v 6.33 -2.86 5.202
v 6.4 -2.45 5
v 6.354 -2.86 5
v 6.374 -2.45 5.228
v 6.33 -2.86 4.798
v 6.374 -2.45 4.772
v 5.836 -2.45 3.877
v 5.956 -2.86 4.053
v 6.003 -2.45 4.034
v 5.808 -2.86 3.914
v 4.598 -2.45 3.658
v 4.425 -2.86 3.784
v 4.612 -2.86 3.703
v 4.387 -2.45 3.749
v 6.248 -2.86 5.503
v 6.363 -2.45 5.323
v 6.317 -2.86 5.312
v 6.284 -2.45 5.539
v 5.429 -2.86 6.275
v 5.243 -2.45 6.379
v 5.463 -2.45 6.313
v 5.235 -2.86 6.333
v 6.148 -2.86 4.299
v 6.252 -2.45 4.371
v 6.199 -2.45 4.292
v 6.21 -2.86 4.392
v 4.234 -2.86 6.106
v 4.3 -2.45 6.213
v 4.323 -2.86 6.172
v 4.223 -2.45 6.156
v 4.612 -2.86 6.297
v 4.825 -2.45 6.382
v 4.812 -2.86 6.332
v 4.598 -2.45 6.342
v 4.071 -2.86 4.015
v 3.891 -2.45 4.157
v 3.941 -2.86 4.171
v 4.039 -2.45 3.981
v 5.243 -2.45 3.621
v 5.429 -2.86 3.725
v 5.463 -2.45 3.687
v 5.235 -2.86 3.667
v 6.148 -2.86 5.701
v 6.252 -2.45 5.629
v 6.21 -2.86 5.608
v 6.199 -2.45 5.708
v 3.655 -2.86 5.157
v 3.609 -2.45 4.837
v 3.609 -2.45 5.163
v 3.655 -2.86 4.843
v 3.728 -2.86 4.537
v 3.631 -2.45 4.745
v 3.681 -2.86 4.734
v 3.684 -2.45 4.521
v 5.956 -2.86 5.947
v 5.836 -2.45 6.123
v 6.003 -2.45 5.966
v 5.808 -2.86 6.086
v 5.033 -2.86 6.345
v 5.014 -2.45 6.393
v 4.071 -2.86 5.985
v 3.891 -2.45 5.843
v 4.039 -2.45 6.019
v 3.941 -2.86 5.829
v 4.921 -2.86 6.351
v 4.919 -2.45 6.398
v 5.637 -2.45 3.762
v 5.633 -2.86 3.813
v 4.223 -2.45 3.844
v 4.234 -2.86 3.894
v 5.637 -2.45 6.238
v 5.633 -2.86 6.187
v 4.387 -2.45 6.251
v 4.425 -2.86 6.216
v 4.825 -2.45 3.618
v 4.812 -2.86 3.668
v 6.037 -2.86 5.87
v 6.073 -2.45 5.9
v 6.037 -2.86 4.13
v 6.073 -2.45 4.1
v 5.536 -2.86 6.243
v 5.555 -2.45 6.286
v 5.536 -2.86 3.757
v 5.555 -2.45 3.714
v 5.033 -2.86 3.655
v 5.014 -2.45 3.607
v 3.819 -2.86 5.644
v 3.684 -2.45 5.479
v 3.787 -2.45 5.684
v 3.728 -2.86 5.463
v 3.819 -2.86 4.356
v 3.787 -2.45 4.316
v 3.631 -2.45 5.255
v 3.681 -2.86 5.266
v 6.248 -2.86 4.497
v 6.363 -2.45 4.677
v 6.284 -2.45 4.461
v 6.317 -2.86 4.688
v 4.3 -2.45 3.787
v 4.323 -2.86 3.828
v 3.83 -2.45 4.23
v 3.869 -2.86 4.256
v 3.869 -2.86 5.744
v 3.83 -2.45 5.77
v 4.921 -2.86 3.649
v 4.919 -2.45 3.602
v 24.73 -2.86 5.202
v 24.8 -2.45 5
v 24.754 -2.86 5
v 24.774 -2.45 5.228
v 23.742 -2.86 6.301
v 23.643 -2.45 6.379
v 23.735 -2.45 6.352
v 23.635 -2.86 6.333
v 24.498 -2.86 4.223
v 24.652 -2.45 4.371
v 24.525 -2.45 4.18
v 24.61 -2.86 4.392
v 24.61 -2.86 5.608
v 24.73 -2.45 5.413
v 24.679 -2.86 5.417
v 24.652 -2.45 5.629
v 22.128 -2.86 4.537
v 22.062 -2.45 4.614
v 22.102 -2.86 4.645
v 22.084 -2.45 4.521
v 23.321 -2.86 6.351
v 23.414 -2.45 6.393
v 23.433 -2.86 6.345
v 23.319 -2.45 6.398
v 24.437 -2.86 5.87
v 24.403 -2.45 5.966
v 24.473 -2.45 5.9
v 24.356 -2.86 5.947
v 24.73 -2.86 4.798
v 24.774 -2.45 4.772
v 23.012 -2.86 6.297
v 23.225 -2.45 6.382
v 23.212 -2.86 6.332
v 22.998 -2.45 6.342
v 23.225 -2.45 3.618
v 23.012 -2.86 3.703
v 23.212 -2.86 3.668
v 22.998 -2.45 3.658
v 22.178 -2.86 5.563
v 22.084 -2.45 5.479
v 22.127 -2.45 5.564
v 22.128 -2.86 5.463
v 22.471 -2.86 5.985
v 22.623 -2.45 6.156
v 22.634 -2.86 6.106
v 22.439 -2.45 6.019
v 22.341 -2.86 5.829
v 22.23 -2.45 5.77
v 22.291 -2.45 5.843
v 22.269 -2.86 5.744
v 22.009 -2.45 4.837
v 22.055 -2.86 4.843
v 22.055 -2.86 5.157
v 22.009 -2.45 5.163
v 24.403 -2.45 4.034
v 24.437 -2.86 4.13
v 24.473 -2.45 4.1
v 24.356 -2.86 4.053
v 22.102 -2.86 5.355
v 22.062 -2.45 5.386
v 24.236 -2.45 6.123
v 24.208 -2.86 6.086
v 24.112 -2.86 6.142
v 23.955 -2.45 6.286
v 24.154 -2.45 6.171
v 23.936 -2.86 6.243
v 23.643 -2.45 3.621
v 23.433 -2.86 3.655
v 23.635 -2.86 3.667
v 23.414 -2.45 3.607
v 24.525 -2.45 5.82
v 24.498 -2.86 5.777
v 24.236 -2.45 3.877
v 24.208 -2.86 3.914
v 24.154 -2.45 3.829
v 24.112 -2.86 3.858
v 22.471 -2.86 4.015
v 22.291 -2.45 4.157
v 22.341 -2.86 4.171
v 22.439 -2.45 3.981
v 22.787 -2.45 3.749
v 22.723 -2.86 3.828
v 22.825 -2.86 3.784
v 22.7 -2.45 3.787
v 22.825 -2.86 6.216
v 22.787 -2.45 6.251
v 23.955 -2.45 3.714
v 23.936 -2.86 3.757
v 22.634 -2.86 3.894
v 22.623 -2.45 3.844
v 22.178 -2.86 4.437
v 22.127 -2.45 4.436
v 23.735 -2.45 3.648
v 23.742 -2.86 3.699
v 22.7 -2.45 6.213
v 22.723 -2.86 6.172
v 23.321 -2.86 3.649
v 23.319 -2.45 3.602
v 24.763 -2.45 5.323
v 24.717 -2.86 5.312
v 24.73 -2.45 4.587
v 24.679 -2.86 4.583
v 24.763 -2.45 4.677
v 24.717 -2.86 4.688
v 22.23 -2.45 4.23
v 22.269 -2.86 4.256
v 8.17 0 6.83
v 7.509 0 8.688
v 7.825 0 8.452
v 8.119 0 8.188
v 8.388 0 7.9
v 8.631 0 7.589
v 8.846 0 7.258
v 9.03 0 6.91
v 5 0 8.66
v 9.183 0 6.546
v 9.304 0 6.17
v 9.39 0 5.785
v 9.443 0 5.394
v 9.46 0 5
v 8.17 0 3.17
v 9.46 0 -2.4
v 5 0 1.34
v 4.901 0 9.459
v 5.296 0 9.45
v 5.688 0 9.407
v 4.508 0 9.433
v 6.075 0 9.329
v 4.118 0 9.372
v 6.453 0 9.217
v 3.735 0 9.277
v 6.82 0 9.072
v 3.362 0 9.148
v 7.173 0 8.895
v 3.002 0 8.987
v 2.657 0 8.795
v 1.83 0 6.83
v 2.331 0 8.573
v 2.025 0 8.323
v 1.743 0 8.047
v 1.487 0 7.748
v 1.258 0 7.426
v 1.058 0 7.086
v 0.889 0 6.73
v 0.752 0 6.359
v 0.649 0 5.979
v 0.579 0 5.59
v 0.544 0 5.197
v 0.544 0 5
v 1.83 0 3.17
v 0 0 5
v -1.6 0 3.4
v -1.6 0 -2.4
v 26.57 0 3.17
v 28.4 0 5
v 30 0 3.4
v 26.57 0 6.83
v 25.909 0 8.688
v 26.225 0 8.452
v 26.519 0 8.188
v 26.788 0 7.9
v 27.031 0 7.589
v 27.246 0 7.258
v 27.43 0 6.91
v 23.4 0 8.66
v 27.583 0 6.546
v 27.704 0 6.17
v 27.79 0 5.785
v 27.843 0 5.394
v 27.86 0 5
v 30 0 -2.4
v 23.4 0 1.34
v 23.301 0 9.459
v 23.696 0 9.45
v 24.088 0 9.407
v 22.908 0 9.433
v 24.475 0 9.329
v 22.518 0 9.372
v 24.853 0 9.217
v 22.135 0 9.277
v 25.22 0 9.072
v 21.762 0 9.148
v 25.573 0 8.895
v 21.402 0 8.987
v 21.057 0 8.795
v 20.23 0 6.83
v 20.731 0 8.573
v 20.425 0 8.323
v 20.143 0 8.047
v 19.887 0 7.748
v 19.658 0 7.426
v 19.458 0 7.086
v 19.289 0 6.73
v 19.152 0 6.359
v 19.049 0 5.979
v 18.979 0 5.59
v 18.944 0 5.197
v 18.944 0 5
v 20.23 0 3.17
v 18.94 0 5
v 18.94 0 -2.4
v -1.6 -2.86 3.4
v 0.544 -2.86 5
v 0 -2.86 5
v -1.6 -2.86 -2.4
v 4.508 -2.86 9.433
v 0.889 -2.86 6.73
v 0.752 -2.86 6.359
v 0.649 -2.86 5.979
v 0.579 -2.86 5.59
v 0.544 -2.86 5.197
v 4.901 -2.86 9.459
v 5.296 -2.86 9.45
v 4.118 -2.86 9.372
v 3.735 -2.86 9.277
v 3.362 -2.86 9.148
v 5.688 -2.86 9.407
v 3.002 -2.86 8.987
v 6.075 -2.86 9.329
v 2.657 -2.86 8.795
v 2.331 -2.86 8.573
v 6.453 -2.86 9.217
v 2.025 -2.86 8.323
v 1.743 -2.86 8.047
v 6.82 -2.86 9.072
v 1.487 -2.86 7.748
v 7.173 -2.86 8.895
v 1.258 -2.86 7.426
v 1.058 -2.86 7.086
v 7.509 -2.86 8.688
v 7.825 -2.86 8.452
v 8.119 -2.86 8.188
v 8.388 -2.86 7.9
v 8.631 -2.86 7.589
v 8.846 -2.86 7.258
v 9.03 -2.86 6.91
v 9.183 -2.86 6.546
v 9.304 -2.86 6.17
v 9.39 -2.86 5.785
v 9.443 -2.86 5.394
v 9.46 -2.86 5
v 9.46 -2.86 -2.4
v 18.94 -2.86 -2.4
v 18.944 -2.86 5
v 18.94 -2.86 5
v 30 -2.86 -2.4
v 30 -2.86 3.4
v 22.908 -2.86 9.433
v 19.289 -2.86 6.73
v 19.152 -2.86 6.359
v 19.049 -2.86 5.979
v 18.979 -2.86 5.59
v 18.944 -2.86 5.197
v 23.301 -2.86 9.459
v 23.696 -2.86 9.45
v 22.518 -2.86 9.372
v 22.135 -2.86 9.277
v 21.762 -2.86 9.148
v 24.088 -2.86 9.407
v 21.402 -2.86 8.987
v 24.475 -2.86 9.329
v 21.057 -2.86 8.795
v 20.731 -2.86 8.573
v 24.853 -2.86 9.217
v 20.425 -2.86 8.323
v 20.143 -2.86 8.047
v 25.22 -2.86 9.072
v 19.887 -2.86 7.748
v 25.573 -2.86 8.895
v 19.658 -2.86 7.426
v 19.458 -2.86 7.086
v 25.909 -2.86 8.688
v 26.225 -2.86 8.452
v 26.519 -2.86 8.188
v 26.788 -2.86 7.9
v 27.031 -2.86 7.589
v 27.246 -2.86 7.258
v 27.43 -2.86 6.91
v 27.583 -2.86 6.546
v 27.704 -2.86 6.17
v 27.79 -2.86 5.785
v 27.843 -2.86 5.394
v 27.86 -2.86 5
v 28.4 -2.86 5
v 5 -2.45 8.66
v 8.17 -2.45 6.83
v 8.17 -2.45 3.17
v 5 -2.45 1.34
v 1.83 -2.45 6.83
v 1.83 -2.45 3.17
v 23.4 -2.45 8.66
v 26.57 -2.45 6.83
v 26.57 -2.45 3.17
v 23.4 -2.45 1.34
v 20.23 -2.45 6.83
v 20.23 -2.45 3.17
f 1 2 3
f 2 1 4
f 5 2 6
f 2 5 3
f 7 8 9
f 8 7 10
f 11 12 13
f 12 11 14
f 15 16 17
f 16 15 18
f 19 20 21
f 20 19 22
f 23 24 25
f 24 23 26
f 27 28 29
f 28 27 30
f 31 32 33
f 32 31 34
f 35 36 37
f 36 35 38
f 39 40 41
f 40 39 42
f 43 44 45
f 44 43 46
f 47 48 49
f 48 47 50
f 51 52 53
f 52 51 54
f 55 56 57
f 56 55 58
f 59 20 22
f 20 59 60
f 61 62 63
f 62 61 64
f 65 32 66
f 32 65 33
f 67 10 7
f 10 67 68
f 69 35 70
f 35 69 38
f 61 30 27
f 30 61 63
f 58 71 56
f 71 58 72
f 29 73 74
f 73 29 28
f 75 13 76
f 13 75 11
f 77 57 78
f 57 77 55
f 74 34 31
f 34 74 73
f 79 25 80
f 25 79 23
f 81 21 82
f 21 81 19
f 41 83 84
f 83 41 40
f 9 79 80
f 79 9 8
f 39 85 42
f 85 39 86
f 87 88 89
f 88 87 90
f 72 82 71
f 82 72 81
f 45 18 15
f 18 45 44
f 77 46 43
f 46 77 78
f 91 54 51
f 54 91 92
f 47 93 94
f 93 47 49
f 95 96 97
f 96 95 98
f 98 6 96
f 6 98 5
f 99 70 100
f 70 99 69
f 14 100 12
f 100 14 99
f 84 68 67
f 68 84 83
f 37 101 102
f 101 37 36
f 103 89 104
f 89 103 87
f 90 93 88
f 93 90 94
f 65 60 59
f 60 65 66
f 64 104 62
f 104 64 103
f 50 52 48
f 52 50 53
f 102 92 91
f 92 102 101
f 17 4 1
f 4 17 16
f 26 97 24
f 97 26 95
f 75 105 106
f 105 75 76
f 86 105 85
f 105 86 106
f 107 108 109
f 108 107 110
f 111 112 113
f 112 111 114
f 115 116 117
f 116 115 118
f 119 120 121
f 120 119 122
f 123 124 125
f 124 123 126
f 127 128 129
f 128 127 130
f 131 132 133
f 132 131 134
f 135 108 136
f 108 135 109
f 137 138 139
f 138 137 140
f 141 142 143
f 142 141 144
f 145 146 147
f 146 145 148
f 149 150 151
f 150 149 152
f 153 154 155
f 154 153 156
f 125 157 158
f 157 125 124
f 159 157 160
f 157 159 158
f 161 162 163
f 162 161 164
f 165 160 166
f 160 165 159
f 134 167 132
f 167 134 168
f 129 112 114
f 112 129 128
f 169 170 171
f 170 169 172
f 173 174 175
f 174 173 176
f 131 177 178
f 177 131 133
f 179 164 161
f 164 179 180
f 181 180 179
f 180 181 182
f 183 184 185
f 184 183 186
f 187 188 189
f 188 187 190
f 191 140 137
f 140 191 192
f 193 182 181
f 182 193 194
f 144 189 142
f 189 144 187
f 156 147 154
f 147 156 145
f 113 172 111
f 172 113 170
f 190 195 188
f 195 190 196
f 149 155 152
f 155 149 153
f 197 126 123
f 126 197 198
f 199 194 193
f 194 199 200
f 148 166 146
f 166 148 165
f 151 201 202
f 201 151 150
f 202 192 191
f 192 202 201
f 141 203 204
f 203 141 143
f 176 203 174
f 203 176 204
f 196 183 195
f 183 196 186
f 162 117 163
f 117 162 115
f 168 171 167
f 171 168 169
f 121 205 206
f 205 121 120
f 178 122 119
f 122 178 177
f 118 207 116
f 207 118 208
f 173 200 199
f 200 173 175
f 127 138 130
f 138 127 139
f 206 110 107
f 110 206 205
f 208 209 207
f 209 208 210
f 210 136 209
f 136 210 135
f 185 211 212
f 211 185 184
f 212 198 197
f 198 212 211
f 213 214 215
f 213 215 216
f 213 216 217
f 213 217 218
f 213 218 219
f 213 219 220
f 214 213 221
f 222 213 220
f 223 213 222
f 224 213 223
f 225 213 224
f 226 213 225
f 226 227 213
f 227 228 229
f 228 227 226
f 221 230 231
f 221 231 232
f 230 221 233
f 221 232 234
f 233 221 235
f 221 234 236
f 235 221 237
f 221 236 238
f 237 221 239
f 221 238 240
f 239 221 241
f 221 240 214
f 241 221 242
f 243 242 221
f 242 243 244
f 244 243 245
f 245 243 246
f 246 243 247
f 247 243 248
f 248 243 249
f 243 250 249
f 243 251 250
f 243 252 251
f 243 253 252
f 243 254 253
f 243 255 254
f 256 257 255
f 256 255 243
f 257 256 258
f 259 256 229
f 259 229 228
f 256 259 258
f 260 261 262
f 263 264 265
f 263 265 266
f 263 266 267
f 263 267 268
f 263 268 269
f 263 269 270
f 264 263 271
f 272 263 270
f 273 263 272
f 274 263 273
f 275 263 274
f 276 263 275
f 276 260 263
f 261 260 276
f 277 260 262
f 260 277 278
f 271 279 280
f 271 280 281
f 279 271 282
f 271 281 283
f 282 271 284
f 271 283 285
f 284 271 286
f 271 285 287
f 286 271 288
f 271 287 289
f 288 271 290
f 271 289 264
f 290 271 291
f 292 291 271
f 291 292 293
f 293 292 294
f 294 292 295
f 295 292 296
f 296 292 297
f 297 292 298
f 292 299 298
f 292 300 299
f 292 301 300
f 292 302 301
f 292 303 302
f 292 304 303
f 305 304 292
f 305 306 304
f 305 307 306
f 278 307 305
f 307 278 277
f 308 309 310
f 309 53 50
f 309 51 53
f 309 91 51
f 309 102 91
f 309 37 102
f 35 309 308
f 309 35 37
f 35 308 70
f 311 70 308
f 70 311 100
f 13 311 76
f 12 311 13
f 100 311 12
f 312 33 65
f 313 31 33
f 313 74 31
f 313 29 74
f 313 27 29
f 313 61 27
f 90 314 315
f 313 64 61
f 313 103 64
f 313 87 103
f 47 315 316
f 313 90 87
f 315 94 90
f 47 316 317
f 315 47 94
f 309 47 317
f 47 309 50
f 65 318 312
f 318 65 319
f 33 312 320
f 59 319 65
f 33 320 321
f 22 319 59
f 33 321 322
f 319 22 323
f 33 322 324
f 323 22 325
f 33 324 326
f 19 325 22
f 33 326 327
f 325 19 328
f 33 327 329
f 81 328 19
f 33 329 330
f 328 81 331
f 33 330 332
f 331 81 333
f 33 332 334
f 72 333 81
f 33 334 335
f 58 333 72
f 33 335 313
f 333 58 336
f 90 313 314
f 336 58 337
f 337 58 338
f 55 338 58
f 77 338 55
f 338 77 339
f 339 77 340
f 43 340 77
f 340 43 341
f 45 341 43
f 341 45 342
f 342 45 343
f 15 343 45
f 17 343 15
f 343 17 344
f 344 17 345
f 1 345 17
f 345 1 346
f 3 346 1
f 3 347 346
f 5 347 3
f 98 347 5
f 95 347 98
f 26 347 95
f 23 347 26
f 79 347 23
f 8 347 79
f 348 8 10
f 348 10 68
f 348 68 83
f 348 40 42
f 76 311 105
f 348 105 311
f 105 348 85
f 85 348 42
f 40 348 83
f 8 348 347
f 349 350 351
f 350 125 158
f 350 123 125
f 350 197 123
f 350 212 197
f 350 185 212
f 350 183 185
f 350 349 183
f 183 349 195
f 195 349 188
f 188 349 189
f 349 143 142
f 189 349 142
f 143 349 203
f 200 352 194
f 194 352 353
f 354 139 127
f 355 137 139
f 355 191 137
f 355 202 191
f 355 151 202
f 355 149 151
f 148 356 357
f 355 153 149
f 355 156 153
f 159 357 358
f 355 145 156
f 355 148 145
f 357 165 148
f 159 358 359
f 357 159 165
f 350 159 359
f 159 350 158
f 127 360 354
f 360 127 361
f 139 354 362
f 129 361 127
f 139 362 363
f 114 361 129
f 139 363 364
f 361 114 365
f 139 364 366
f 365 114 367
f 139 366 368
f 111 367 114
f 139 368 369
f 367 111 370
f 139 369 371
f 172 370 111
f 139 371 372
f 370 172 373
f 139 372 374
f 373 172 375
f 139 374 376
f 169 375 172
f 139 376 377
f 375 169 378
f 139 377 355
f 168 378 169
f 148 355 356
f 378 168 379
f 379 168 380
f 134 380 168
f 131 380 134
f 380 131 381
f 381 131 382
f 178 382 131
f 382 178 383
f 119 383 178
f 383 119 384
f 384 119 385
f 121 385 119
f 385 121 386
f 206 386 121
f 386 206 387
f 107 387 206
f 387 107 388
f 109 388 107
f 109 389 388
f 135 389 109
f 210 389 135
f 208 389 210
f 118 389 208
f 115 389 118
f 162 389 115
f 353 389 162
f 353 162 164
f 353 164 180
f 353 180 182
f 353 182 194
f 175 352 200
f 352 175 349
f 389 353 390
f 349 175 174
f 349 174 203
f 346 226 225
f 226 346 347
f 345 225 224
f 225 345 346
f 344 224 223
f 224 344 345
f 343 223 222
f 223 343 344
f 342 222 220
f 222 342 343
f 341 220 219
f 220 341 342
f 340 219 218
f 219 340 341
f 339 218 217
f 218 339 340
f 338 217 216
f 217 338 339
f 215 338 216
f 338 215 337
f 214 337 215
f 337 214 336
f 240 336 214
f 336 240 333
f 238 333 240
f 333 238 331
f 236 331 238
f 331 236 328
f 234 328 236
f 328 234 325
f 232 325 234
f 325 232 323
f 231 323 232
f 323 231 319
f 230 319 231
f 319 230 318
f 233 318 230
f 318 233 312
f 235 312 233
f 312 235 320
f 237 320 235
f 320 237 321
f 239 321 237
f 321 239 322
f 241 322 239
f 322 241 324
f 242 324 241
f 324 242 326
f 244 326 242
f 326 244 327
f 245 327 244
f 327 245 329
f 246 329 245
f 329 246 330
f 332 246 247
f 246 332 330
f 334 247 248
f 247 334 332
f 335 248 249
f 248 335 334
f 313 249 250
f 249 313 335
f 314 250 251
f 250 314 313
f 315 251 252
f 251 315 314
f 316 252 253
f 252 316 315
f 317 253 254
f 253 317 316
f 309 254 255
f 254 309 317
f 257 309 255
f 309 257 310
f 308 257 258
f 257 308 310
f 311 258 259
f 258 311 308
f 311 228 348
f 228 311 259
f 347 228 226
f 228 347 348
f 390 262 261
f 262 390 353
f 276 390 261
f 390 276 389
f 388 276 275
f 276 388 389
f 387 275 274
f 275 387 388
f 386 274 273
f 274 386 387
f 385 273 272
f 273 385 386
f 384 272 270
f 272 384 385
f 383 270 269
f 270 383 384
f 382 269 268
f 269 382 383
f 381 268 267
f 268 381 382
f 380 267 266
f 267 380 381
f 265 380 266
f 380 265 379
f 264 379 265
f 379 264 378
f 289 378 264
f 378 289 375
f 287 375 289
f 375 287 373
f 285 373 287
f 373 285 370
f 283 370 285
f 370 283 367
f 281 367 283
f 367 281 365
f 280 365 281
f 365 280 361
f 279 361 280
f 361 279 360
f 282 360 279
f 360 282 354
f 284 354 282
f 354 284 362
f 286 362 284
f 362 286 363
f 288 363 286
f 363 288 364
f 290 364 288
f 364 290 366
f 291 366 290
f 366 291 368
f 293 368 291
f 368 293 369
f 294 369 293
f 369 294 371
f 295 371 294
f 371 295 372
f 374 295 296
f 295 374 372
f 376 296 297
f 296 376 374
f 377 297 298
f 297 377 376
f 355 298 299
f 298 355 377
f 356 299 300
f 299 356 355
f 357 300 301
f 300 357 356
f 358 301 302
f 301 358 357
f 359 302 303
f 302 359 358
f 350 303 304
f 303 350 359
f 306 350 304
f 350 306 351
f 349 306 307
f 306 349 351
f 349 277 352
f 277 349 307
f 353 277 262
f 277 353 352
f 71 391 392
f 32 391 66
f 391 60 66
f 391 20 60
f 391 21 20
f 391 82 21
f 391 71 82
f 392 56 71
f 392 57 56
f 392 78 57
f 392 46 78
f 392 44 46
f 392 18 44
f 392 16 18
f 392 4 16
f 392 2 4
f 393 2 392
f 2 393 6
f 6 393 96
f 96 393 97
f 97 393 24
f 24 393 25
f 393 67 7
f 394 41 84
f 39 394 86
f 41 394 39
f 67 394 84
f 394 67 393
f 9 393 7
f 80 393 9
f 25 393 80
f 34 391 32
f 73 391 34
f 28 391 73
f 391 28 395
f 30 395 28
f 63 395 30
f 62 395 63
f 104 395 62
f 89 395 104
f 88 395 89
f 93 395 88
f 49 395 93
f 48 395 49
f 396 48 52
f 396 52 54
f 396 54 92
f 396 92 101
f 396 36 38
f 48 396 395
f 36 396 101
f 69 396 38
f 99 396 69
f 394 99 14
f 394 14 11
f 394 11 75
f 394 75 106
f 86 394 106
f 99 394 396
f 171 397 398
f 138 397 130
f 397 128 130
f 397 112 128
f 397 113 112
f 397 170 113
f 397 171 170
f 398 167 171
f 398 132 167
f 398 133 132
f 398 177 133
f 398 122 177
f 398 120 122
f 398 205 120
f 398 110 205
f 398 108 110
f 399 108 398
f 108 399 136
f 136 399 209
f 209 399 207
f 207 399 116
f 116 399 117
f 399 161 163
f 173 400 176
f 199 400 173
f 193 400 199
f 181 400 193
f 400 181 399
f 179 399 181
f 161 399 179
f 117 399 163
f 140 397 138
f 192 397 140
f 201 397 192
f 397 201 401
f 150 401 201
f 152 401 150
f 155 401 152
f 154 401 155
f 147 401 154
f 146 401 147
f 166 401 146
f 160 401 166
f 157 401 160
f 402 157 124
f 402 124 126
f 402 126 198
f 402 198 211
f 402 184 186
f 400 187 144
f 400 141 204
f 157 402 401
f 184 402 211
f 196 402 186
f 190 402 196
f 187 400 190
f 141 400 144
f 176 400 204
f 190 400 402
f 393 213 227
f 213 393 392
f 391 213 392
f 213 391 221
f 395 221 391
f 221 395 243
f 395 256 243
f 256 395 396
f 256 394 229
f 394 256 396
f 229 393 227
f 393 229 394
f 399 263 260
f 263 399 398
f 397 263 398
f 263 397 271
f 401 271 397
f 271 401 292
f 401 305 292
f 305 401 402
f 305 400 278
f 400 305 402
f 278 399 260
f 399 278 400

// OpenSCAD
// Copyright (C) 2025 Arif K. Rafiq
// This program is free software: you can redistribute it and/or modify
// it under the terms of the GNU General Public License as published by
// the Free Software Foundation, either version 3 of the License, or
// (at your option) any later version.

// This program is distributed in the hope that it will be useful,
// but WITHOUT ANY WARRANTY; without even the implied warranty of
// MERCHANTABILITY or FITNESS FOR A PARTICULAR PURPOSE.  See the
// GNU General Public License for more details.

// You should have received a copy of the GNU General Public License
// along with this file.  If not, see <https://www.gnu.org/licenses/>,
// or write to: license@temperedoptimism.com


/* 
(b)readth       :(w)est (X-)   (c)enter (X0) (e)east (X+)
Vectors (v)     :(x), (y), (z)
Thicknesses (t) : Thicknesses to resolve 3D printer limits or rendering issues.
Proportion (p)  : container for grouping (r)adius and (i)ntensity into a singl 2d vector acccessed using .x and .y respectively
*/
/* 14:45 */
// Fixed in example3.scad       // Set limits in customizer
/* [Thicknesses (x),(y),(z)] */
tFitGap = [0.16, 0.16, 0.16];   //[0.00:0.01:0.64] 
tWallMin = [0.40, 0.40, 0.16];  //[0.16:0.08:1.60] 
/* [Proportional (x):(Radius, (y):(i)ntensity] */
pHexSink = [3.5, 2.3];          //[0.10:0.02:20.00] 
pFastShaft = [1.36, 5.80]; //0.10:0.02:20.00]
/* [2D vectors (x), (y)] */
vTerminalW = [5.0, 5.0];        //[0.00:0.10:100] 
vTerminalE = [23.4, 5.0];       //[0.00:0.10:100] 
/* [Scalars] */
leadingEdge = 2.4; //[0.8:0.4:5.0]
flankEdge = 1.6; //[0.8:0.4:5.0]
bBoard = 28.4; //[20:0.1:100.0]
/* [Special ] */
fa0 = 4.0;     //[1:1:60]  
fs0 = 0.4;     //[0.1:0.1:4.0]  
fx0 = 3;       //[1,2,3,4,5,6,7,8,9,10]
rCorner = 1.6; //0.1
/* [Hidden] */ 
tEps=0.01; 

/* Calucualted at run time. */
pHexSurround = [pHexSink.x + (tWallMin.x * 2) + tFitGap.x, pHexSink.y + tWallMin.y + tFitGap.y];

//30.00-35.00 Circles, Also look at the customizer!!
// Rotate
rotate([90,0,0]){
  difference(){

    linear_extrude(pHexSurround.y, convexity=fx0){ 
      polygon([[vTerminalW.x + pHexSurround.x, vTerminalW.y],
              [ vTerminalW.x + pHexSurround.x, -leadingEdge],
              [-flankEdge, -leadingEdge],
              [-flankEdge, vTerminalW.y - rCorner],
              [-flankEdge + rCorner, vTerminalW.y]]);
      polygon([[vTerminalE.x - pHexSurround.x, vTerminalE.y],
              [ vTerminalE.x - pHexSurround.x, -leadingEdge],
              [bBoard + flankEdge, -leadingEdge],
              [bBoard + flankEdge, vTerminalE.y - rCorner],
              [bBoard + flankEdge - rCorner, vTerminalE.y]]);       
              
      for(v = [vTerminalW, vTerminalE]){
        translate(v)  circle(pHexSurround.x, $fa=fa0, $fs=fs0 );
      }
    }
    //hex pocket
    // Solve Conflicting bodies
    // This could be a loop see: 16:05 in the Video:
    //  https://www.youtube.com/watch?v=R-gRqGRss1k   
    translate([0,0, -tEps]) linear_extrude(pHexSink.y + tFitGap.y, convexity=fx0){
      translate(vTerminalW)  rotate([0,0,30]) circle(pHexSink.x + tFitGap.y, $fn=6);
      translate(vTerminalE)  rotate([0,0,30]) circle(pHexSink.x + tFitGap.y, $fn=6);
    }
    // fastner hole
    for(v = [vTerminalW, vTerminalE]){
        translate(v) cylinder(pFastShaft.y + tFitGap.y, pFastShaft.x + (tFitGap.x * 2), $fa=fa0, $fs=fs0);
    }
  }
}
